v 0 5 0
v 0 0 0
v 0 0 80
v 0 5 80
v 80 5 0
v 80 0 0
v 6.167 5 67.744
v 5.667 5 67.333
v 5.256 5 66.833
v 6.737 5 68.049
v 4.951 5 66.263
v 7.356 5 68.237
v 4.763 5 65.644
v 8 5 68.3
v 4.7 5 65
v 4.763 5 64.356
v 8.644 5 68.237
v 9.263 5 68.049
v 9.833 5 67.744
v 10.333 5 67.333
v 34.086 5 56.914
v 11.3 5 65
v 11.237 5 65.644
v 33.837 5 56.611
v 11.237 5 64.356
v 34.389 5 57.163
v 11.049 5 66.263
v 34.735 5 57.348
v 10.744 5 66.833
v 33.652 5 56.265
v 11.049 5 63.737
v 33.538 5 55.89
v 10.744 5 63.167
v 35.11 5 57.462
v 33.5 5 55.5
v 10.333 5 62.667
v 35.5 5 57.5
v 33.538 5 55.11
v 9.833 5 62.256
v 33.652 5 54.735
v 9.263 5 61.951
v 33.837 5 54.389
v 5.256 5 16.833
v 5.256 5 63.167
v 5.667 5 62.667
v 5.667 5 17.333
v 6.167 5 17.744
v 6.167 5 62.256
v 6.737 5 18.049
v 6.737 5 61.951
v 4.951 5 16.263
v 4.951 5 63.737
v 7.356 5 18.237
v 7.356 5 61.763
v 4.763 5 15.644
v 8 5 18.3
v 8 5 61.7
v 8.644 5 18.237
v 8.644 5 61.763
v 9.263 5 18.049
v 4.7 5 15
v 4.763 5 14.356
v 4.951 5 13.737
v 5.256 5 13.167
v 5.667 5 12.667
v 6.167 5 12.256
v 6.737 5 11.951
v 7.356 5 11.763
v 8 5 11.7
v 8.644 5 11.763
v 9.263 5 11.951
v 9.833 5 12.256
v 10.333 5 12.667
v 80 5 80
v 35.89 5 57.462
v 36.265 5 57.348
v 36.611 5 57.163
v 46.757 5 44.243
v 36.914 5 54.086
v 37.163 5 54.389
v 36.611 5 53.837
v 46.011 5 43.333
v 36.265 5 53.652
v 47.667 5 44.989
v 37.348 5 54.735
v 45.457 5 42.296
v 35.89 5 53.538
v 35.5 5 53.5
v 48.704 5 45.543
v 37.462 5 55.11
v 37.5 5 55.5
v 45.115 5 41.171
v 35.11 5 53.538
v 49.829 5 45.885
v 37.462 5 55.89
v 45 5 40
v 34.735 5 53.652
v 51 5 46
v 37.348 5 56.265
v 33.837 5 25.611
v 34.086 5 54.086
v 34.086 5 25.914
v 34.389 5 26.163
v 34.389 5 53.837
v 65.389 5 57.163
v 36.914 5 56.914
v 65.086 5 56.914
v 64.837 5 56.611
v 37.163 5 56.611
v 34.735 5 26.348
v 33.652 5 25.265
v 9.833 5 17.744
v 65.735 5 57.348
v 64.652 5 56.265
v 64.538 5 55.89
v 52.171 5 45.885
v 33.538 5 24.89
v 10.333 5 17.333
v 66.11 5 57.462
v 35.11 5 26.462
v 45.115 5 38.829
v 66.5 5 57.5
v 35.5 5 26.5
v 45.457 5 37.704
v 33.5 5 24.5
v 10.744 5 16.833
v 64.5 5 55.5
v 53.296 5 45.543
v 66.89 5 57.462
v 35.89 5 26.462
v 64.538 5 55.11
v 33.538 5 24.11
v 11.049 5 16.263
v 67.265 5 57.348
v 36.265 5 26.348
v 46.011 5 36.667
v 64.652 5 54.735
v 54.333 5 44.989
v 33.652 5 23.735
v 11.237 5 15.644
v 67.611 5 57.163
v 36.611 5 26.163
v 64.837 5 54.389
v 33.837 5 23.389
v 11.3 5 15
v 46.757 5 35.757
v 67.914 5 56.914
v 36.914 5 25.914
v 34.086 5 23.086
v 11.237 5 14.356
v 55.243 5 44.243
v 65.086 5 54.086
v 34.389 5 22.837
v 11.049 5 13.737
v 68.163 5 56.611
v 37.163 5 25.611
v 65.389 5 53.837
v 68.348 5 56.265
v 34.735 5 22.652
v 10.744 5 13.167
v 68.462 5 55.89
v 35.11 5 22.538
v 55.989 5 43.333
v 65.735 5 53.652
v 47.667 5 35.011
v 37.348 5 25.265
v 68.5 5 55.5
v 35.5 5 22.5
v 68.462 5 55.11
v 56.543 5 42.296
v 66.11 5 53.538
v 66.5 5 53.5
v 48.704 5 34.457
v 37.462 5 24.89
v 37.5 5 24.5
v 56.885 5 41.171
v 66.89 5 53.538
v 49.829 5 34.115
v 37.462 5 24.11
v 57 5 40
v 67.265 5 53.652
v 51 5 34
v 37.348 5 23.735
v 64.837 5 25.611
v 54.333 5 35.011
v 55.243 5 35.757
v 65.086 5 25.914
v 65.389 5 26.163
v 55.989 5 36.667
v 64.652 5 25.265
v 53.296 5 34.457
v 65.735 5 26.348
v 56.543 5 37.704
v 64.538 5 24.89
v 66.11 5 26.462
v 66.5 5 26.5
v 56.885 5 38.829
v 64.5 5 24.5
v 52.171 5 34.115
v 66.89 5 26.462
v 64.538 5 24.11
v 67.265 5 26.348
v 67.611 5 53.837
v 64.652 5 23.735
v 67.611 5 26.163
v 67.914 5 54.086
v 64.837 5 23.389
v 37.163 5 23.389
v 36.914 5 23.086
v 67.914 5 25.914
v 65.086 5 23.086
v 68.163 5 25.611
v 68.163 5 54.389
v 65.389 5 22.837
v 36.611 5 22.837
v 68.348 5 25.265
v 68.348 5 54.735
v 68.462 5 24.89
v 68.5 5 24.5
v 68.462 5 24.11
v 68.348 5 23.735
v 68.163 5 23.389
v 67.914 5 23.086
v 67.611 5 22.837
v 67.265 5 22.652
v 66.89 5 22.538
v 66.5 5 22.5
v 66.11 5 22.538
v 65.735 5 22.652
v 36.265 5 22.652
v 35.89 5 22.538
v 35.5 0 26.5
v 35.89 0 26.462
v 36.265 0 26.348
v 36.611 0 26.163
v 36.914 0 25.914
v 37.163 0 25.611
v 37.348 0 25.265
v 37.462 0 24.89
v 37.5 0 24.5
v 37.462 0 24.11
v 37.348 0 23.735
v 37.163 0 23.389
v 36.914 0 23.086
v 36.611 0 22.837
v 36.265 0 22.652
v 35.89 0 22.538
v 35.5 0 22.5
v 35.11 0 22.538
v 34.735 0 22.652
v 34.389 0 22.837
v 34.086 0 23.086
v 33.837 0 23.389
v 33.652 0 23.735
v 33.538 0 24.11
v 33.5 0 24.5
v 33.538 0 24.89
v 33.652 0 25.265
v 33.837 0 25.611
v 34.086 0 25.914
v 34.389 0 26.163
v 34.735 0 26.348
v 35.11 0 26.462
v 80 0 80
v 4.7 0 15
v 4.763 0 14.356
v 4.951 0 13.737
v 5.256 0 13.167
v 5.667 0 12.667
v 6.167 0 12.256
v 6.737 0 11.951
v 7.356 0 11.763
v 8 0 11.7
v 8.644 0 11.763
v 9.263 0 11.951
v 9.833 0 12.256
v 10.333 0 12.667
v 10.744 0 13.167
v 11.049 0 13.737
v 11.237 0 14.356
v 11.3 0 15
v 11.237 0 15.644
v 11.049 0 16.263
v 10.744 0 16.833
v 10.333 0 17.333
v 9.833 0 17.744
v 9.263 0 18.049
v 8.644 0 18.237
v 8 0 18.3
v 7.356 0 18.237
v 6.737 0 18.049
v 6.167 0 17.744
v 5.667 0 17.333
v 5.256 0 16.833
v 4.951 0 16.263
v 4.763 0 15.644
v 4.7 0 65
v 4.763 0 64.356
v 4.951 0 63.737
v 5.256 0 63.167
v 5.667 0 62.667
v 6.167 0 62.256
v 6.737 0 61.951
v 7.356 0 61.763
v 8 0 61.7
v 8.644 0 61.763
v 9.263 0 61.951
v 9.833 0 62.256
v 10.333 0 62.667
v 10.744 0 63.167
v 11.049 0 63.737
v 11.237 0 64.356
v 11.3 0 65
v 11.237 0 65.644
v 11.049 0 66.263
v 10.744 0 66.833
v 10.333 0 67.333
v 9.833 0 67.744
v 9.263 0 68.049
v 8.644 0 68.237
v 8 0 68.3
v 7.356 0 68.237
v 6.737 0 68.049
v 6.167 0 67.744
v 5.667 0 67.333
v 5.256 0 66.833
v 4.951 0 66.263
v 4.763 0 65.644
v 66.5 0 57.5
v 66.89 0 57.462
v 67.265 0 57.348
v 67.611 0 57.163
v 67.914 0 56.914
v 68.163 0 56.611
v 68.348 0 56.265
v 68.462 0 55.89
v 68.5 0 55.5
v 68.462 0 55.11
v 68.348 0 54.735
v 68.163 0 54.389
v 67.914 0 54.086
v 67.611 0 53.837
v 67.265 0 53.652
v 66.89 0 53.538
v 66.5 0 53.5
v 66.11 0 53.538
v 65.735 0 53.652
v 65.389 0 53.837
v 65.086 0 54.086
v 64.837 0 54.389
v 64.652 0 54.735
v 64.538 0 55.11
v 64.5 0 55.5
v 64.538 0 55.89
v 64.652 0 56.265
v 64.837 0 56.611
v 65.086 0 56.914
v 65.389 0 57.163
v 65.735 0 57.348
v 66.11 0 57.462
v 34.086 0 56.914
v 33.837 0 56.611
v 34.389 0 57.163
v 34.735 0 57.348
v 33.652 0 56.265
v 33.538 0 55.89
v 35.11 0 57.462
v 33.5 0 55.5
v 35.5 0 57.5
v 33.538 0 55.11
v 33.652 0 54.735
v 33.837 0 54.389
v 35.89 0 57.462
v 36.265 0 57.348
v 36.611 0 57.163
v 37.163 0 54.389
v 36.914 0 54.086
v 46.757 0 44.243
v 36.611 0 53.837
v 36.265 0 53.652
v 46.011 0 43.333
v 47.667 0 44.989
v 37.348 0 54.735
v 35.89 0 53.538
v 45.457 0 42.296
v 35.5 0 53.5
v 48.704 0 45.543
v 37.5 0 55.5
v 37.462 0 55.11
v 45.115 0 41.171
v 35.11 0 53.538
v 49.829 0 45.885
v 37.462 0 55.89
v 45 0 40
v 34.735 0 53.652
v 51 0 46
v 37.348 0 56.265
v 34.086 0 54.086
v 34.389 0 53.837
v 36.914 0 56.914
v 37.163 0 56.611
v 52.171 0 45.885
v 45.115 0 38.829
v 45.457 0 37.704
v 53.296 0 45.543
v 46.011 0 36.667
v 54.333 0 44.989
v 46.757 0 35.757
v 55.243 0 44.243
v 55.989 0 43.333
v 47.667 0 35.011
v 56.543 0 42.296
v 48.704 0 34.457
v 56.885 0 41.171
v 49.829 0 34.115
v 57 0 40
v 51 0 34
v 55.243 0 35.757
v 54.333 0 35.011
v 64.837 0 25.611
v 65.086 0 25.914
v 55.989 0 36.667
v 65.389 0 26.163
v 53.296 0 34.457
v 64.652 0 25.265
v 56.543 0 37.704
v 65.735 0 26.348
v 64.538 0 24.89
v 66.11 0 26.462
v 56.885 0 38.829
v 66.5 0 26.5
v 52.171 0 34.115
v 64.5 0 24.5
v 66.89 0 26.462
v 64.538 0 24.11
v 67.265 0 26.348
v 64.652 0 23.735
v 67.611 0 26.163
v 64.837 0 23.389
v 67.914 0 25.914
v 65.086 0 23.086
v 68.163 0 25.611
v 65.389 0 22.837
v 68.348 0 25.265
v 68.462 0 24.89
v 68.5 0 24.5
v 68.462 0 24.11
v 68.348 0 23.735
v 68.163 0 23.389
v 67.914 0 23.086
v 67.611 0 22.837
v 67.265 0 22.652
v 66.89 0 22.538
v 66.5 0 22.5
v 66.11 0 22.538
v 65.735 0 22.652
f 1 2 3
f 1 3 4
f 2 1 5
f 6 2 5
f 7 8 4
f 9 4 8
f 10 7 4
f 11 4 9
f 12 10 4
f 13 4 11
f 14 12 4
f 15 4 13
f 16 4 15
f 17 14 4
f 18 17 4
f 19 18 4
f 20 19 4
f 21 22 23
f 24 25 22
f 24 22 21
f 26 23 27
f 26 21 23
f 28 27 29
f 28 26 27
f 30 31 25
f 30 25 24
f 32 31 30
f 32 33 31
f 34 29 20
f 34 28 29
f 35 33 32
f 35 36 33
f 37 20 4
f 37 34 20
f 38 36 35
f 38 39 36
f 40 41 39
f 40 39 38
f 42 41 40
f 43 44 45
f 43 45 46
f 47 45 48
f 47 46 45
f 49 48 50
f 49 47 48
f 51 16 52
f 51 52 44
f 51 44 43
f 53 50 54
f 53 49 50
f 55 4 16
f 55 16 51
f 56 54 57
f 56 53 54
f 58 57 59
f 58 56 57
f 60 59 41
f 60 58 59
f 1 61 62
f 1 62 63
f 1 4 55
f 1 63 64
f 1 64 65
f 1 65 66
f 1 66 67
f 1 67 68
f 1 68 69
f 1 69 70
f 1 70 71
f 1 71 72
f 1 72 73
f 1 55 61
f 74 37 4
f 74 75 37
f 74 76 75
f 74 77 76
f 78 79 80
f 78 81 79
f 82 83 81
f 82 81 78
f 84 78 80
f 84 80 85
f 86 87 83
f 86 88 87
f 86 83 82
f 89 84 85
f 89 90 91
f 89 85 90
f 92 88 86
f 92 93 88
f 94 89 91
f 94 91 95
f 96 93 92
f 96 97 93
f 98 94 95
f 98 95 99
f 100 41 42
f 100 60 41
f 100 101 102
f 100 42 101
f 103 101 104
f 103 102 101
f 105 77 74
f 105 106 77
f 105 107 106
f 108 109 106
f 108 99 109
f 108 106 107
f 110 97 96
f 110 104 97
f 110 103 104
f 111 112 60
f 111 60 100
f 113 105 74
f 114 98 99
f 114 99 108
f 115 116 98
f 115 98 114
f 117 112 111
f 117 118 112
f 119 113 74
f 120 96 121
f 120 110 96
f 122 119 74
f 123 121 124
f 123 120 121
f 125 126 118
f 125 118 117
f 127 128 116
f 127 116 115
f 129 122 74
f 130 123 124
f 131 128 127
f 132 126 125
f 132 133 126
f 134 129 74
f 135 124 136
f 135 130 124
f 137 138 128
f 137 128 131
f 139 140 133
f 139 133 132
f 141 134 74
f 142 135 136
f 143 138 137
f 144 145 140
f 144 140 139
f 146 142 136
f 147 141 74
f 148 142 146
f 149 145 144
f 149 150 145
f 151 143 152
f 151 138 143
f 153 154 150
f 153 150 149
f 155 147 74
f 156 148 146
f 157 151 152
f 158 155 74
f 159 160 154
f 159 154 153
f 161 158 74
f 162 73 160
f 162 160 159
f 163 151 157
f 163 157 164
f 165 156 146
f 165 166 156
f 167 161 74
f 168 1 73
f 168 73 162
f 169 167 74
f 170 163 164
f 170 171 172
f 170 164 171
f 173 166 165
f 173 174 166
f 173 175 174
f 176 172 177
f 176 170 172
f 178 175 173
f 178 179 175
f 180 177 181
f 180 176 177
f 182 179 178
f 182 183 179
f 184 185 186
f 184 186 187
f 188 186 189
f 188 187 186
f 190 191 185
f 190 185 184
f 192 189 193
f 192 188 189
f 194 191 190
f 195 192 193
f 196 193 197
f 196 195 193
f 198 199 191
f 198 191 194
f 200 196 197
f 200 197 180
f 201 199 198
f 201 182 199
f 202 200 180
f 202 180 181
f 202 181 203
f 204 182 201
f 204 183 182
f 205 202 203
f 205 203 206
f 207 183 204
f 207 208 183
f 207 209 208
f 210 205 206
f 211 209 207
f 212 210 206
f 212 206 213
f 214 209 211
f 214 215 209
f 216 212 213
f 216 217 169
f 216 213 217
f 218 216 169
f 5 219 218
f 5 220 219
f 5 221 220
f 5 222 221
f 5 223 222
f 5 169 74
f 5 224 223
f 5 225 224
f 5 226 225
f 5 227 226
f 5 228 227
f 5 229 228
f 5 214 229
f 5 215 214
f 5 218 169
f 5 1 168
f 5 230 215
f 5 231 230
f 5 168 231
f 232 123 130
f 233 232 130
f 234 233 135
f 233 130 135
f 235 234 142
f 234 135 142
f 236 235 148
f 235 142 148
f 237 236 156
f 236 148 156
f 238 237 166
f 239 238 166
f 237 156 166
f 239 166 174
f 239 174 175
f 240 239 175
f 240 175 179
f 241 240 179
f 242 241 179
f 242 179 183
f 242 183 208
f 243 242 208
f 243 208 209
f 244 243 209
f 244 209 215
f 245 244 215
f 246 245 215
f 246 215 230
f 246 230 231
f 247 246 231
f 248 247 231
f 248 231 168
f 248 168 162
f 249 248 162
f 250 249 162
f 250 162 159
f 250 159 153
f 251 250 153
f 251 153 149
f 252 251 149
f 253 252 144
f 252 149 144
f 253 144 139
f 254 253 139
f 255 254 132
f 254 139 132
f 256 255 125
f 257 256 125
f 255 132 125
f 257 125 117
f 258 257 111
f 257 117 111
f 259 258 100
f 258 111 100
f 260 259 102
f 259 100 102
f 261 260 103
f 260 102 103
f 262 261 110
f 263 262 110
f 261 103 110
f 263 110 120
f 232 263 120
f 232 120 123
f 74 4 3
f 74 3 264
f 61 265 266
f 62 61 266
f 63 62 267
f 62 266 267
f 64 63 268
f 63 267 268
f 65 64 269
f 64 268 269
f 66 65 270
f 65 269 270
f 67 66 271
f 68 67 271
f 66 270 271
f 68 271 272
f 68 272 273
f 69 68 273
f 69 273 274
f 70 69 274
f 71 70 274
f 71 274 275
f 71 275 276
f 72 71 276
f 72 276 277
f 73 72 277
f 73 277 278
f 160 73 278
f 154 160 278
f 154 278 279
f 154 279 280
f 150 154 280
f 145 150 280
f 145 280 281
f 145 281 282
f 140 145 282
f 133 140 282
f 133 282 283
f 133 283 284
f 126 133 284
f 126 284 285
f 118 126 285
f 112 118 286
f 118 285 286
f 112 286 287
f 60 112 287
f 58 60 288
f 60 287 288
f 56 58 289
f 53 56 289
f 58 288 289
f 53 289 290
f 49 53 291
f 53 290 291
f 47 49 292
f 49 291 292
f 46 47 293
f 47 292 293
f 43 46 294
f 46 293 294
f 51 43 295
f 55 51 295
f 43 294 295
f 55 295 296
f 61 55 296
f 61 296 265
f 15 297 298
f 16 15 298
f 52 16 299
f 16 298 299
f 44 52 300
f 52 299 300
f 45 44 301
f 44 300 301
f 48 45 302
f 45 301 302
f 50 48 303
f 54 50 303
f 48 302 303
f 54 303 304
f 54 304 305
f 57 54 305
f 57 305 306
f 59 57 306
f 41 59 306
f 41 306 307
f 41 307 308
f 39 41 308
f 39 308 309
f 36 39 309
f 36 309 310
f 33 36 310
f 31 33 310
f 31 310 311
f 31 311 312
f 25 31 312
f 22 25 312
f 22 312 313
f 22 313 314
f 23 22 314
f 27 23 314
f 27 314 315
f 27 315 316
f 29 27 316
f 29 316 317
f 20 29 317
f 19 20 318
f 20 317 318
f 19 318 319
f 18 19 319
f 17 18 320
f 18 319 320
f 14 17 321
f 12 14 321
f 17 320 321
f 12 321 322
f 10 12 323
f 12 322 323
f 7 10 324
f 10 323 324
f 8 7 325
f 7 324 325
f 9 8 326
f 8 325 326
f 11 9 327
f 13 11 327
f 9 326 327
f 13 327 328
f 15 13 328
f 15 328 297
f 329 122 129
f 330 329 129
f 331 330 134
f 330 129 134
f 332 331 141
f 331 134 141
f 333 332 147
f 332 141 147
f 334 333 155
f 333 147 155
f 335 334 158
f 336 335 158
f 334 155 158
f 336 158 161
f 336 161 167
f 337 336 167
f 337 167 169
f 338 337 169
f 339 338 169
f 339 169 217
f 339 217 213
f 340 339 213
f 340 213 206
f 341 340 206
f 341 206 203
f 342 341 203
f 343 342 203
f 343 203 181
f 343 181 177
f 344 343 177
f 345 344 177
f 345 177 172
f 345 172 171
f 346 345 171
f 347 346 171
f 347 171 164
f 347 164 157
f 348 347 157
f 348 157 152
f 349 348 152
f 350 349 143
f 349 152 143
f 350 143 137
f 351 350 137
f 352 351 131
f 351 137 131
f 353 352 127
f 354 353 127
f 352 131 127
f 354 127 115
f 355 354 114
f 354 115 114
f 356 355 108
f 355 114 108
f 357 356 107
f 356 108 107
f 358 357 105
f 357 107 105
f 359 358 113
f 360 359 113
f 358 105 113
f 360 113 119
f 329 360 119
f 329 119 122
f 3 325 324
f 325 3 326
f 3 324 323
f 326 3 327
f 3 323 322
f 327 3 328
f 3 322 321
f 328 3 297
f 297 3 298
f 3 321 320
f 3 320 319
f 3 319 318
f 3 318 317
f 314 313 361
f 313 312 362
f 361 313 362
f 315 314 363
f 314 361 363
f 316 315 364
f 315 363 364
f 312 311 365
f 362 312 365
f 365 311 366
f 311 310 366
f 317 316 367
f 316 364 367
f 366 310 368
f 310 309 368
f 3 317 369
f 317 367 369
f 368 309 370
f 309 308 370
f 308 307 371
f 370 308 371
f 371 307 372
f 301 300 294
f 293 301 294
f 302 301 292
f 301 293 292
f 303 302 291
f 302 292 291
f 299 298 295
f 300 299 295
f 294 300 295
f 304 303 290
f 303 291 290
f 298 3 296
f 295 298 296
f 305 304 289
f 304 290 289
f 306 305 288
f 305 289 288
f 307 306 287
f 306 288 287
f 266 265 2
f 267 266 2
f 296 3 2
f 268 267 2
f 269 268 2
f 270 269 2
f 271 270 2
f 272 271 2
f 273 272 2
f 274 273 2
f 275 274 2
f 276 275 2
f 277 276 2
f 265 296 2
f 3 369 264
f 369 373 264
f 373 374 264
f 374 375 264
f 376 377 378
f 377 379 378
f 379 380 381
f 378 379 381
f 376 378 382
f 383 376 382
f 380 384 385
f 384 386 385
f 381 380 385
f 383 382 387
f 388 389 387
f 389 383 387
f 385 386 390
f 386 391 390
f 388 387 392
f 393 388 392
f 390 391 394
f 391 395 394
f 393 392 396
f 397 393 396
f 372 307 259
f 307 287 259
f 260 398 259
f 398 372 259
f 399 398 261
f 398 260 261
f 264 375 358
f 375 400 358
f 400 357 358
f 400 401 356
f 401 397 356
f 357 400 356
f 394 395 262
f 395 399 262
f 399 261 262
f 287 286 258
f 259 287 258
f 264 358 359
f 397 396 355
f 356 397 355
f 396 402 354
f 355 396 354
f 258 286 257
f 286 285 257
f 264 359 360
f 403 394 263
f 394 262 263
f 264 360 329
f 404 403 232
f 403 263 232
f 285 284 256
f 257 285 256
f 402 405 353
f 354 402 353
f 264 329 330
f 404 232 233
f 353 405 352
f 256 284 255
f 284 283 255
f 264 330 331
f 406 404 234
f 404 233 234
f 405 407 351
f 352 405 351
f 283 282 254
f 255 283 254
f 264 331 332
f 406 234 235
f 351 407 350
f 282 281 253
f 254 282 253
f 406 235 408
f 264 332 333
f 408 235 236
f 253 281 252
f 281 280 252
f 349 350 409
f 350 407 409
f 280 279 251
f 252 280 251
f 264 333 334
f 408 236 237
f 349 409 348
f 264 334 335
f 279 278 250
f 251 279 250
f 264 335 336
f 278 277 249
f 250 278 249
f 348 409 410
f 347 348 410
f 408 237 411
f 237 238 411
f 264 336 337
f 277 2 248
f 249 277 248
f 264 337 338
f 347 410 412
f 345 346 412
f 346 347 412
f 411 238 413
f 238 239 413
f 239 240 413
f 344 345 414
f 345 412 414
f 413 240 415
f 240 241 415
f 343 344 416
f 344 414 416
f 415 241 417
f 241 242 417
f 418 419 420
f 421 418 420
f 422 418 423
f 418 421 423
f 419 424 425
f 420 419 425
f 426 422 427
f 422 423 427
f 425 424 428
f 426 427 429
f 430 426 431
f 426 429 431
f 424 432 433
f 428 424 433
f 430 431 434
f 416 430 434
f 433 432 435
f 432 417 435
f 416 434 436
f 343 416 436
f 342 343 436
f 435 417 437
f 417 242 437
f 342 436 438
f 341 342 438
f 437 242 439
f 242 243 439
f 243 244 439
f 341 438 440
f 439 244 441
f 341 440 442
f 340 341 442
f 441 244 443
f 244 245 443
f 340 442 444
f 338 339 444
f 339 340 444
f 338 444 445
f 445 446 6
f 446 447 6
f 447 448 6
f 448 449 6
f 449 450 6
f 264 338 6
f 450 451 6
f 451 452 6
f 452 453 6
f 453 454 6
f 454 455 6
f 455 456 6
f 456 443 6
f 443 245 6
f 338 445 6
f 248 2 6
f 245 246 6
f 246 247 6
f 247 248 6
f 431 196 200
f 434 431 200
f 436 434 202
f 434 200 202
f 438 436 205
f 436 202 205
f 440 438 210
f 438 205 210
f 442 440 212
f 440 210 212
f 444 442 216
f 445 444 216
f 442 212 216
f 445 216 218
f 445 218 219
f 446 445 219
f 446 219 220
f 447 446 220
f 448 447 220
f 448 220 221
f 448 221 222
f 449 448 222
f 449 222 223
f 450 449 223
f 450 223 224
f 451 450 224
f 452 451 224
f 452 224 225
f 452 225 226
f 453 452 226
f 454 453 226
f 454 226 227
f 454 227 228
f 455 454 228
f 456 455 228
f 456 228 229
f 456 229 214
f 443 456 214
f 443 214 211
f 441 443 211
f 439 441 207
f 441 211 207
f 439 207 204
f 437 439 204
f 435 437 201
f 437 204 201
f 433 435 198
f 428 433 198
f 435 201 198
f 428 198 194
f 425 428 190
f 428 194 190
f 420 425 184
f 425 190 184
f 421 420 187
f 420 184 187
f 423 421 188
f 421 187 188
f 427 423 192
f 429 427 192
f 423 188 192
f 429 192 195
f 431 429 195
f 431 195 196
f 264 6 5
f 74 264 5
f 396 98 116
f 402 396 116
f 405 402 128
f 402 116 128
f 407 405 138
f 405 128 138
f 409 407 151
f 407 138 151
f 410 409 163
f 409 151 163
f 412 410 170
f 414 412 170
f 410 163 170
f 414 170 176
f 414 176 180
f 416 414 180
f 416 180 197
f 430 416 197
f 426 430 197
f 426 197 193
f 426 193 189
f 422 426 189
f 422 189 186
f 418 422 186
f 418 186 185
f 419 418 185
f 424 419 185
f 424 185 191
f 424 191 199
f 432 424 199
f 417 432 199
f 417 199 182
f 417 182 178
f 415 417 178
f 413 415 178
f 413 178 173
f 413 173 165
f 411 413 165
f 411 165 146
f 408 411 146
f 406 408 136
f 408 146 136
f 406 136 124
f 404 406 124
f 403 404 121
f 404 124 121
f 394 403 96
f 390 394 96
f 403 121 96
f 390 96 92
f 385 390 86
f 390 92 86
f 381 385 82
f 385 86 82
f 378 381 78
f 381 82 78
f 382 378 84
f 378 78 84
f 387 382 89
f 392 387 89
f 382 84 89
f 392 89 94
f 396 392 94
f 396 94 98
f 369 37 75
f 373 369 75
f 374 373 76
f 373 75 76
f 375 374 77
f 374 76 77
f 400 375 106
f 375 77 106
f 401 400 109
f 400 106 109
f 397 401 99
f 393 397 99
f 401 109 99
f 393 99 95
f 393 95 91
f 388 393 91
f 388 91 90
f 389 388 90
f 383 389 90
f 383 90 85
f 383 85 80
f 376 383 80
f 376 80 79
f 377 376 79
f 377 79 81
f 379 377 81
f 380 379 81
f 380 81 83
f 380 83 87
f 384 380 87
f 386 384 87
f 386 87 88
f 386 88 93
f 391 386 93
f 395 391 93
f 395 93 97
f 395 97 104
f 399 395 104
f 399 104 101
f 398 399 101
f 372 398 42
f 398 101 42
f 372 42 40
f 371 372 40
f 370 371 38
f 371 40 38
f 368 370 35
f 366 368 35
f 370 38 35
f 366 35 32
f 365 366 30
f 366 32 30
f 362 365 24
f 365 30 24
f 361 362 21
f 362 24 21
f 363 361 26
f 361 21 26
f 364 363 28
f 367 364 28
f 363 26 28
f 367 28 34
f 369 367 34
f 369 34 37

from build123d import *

# Parameters (mm, degrees)
SCHIZZO1_W                   = 80
SCHIZZO1_H                   = 5
ESTRUSIONE_ESTRUSIONE1_DEPTH = 80
FORO_PER_VITE_M6_1_D         = 6.6
SCHIZZO4_R                   = 6
TAGLIO_ESTRUSIONE1_DEPTH     = 114.247516529
SCHIZZO6_R                   = 2
TAGLIO_ESTRUSIONE3_DEPTH     = 114.247516529


with BuildPart() as part:
    # Schizzo1 → Estrusione-Estrusione1 (new body)
    with BuildSketch(Plane.XY):
        with Locations((40, 2.5)):
            Rectangle(SCHIZZO1_W, SCHIZZO1_H)
    extrude(amount=ESTRUSIONE_ESTRUSIONE1_DEPTH)

    # Foro per Vite M6-1 (through all)
    with Locations(Plane(origin=(0, 5, 0), x_dir=(1, 0, 0), z_dir=(0, 1, 0))):
        with Locations((8, -15), (8, -65)):
            Hole(FORO_PER_VITE_M6_1_D / 2)

    # Schizzo4 → Taglio-Estrusione1 (cut, through all)
    with BuildSketch(Plane(origin=(0, 5, 0), x_dir=(1, 0, 0), z_dir=(0, 1, 0))):
        with Locations(Location((51, -40, 0), (0, 0, 270))):
            Circle(SCHIZZO4_R)
    extrude(amount=-TAGLIO_ESTRUSIONE1_DEPTH, mode=Mode.SUBTRACT)

    # Schizzo6 → Taglio-Estrusione3 (cut, through all)
    with BuildSketch(Plane(origin=(0, 5, 0), x_dir=(1, 0, 0), z_dir=(0, 1, 0))):
        with Locations(Location((35.5, -24.5, 0), (0, 0, 270))):
            Circle(SCHIZZO6_R)
        with Locations(Location((66.5, -24.5, 0), (0, 0, 270))):
            Circle(SCHIZZO6_R)
        with Locations(Location((66.5, -55.5, 0), (0, 0, 270))):
            Circle(SCHIZZO6_R)
        with Locations(Location((35.5, -55.5, 0), (0, 0, 270))):
            Circle(SCHIZZO6_R)
    extrude(amount=-TAGLIO_ESTRUSIONE3_DEPTH, mode=Mode.SUBTRACT)


solid = part.part
